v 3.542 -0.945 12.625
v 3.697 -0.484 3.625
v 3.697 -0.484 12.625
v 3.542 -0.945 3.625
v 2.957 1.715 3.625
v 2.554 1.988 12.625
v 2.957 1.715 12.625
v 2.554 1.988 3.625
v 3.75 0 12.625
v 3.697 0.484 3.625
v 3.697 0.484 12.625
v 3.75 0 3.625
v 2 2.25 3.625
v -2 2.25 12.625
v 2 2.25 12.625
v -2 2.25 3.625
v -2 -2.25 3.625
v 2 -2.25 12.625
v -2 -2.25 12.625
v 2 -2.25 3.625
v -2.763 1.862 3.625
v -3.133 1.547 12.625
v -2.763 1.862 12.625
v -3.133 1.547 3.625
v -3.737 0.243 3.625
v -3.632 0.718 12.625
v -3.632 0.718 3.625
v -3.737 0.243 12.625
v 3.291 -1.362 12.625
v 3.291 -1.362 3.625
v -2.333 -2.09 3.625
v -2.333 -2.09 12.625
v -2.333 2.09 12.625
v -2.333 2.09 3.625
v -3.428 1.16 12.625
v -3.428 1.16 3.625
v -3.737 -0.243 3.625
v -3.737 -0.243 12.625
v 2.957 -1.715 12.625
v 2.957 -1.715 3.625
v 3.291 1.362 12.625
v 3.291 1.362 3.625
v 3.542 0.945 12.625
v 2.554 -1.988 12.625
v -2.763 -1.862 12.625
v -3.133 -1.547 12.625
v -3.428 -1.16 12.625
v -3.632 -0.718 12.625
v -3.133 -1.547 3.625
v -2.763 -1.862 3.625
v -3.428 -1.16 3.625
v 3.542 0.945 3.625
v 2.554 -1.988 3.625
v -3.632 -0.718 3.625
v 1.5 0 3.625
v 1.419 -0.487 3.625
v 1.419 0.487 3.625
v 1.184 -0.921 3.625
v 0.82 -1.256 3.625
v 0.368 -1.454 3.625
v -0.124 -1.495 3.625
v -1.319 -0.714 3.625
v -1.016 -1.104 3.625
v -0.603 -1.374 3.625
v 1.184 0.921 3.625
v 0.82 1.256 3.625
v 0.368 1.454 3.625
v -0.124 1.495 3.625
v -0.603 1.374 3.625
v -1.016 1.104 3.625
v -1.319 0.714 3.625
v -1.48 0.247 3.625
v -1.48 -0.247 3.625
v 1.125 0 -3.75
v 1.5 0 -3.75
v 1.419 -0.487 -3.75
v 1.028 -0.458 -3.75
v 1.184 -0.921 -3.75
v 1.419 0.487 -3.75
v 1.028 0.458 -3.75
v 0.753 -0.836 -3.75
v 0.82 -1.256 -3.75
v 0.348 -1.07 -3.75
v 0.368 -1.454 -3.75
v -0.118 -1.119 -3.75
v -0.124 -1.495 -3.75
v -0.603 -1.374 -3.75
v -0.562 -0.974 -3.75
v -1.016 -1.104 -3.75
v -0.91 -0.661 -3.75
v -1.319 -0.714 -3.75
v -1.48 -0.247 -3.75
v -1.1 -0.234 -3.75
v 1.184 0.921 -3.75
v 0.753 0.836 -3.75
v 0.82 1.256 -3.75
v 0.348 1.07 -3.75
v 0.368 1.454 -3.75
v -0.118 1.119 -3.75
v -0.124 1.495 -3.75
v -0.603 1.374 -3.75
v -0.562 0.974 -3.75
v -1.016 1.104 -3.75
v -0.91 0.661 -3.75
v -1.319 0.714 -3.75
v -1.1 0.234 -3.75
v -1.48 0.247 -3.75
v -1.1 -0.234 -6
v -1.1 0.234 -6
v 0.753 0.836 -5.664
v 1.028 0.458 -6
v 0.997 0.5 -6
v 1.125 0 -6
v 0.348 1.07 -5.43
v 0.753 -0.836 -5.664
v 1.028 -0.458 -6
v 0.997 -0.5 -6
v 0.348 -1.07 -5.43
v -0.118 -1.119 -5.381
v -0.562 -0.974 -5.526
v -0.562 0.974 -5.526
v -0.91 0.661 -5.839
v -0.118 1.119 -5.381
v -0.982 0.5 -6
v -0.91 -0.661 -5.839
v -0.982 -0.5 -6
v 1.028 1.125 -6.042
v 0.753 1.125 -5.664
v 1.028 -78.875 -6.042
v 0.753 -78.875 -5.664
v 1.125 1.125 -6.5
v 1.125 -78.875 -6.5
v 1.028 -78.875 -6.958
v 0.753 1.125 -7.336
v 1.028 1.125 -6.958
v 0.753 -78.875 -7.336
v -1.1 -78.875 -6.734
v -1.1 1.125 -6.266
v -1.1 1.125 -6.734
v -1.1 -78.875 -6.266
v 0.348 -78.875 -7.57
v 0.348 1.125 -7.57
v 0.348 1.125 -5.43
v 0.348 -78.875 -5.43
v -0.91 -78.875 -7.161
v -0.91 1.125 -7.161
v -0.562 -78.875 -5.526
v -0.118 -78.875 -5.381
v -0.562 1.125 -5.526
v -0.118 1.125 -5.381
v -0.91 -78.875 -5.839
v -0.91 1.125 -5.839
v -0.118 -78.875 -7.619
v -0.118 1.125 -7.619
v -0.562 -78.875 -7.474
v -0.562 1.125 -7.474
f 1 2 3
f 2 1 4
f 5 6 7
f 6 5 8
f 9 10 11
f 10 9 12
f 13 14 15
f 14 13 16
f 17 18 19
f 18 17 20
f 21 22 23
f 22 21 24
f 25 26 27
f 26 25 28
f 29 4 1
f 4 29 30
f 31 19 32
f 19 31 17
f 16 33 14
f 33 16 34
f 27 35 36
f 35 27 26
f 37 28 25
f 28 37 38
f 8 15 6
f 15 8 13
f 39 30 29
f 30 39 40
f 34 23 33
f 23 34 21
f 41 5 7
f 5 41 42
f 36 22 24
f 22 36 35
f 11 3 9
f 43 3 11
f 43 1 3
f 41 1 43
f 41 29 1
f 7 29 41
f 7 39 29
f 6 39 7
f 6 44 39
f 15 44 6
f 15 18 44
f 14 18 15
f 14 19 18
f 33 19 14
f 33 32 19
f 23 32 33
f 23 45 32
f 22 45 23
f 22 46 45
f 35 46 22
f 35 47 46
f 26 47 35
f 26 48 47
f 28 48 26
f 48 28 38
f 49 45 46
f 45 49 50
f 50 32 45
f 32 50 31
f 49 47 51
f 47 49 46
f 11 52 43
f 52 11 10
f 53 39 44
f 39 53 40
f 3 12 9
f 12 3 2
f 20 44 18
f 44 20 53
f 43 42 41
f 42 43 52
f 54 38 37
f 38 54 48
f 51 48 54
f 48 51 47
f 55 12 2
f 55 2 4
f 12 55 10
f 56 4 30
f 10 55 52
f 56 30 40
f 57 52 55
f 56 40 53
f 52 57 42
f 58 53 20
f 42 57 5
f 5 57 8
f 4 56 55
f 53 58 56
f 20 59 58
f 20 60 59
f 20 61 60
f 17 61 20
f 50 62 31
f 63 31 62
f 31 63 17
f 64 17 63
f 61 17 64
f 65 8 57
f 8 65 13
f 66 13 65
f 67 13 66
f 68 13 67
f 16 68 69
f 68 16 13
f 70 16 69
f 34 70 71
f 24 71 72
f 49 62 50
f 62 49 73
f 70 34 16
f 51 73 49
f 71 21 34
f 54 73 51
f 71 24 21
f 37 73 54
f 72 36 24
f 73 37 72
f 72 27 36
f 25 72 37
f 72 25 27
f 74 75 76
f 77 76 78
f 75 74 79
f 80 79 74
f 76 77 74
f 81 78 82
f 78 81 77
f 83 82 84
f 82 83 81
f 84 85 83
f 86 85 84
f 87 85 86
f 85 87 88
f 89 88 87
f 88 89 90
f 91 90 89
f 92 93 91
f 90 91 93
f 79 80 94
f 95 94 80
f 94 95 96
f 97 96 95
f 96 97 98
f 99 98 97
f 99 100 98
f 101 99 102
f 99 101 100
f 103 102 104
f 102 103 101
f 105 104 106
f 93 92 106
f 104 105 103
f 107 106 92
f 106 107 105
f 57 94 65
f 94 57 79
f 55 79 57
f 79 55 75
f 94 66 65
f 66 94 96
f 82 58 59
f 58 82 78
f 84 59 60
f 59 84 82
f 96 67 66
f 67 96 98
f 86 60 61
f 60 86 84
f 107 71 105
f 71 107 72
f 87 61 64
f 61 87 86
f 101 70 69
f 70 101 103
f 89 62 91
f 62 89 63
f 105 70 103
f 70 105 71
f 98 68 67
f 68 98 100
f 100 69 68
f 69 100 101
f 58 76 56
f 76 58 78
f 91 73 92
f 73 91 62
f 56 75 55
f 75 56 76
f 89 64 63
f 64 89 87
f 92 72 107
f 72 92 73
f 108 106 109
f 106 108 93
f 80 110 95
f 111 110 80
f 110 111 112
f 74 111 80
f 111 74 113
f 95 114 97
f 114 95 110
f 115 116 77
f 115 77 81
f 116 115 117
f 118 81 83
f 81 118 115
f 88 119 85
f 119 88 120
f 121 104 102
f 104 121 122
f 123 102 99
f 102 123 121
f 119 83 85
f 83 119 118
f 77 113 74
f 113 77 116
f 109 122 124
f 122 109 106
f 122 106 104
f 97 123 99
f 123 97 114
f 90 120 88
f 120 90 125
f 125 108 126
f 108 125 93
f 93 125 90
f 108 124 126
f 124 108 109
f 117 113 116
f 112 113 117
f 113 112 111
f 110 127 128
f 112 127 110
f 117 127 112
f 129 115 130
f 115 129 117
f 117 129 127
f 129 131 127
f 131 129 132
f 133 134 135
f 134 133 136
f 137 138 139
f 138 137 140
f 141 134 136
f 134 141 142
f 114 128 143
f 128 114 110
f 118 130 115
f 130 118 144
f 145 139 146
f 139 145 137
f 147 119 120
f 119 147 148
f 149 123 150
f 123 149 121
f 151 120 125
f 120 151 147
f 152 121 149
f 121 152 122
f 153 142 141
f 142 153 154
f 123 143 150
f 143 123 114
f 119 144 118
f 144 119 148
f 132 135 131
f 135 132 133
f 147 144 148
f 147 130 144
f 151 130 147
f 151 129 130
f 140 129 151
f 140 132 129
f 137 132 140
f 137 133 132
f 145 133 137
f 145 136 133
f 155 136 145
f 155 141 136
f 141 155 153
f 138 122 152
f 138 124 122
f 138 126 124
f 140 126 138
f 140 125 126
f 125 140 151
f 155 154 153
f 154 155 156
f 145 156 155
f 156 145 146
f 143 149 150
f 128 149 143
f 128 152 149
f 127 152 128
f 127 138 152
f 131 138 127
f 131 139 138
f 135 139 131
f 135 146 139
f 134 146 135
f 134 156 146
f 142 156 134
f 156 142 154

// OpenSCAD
$fa=1;
$fs=0.5;

// lightning cable head end
module lightning_head() {
  // 14mm tall including the 5mm tip
  // 6 mm wide
  // 4.5 mm thick
  hull() {
    cube([4, 4.5, 9], center=true);
    translate([1.5, 0, 0]) cylinder(r=2.25, h=9, center=true);
    translate([-1.5, 0, 0]) cylinder(r=2.25, h=9, center=true);
  }
}

// lightning head sleeve
module lightning_head_sleeve() {
  // sleeve width is 3mm, 7.5mm tall)
  cylinder(r=1.5, h=7.5, center=true);
}

module lightning_cable(length = 4, c=true) {
  // cable itself is 2.5
  cylinder(r=1.125, h=length, center=c);
}

module lightning_end() {
  translate([0, 0, 8.125]) lightning_head();
  lightning_head_sleeve();
  translate([0, 0, -4]) lightning_cable();
}

module lightning() {
  lightning_end();
  rotate([90, 0, 0]) translate ([0, -6.5, -1.125]) lightning_cable(80, false);
}

lightning();
